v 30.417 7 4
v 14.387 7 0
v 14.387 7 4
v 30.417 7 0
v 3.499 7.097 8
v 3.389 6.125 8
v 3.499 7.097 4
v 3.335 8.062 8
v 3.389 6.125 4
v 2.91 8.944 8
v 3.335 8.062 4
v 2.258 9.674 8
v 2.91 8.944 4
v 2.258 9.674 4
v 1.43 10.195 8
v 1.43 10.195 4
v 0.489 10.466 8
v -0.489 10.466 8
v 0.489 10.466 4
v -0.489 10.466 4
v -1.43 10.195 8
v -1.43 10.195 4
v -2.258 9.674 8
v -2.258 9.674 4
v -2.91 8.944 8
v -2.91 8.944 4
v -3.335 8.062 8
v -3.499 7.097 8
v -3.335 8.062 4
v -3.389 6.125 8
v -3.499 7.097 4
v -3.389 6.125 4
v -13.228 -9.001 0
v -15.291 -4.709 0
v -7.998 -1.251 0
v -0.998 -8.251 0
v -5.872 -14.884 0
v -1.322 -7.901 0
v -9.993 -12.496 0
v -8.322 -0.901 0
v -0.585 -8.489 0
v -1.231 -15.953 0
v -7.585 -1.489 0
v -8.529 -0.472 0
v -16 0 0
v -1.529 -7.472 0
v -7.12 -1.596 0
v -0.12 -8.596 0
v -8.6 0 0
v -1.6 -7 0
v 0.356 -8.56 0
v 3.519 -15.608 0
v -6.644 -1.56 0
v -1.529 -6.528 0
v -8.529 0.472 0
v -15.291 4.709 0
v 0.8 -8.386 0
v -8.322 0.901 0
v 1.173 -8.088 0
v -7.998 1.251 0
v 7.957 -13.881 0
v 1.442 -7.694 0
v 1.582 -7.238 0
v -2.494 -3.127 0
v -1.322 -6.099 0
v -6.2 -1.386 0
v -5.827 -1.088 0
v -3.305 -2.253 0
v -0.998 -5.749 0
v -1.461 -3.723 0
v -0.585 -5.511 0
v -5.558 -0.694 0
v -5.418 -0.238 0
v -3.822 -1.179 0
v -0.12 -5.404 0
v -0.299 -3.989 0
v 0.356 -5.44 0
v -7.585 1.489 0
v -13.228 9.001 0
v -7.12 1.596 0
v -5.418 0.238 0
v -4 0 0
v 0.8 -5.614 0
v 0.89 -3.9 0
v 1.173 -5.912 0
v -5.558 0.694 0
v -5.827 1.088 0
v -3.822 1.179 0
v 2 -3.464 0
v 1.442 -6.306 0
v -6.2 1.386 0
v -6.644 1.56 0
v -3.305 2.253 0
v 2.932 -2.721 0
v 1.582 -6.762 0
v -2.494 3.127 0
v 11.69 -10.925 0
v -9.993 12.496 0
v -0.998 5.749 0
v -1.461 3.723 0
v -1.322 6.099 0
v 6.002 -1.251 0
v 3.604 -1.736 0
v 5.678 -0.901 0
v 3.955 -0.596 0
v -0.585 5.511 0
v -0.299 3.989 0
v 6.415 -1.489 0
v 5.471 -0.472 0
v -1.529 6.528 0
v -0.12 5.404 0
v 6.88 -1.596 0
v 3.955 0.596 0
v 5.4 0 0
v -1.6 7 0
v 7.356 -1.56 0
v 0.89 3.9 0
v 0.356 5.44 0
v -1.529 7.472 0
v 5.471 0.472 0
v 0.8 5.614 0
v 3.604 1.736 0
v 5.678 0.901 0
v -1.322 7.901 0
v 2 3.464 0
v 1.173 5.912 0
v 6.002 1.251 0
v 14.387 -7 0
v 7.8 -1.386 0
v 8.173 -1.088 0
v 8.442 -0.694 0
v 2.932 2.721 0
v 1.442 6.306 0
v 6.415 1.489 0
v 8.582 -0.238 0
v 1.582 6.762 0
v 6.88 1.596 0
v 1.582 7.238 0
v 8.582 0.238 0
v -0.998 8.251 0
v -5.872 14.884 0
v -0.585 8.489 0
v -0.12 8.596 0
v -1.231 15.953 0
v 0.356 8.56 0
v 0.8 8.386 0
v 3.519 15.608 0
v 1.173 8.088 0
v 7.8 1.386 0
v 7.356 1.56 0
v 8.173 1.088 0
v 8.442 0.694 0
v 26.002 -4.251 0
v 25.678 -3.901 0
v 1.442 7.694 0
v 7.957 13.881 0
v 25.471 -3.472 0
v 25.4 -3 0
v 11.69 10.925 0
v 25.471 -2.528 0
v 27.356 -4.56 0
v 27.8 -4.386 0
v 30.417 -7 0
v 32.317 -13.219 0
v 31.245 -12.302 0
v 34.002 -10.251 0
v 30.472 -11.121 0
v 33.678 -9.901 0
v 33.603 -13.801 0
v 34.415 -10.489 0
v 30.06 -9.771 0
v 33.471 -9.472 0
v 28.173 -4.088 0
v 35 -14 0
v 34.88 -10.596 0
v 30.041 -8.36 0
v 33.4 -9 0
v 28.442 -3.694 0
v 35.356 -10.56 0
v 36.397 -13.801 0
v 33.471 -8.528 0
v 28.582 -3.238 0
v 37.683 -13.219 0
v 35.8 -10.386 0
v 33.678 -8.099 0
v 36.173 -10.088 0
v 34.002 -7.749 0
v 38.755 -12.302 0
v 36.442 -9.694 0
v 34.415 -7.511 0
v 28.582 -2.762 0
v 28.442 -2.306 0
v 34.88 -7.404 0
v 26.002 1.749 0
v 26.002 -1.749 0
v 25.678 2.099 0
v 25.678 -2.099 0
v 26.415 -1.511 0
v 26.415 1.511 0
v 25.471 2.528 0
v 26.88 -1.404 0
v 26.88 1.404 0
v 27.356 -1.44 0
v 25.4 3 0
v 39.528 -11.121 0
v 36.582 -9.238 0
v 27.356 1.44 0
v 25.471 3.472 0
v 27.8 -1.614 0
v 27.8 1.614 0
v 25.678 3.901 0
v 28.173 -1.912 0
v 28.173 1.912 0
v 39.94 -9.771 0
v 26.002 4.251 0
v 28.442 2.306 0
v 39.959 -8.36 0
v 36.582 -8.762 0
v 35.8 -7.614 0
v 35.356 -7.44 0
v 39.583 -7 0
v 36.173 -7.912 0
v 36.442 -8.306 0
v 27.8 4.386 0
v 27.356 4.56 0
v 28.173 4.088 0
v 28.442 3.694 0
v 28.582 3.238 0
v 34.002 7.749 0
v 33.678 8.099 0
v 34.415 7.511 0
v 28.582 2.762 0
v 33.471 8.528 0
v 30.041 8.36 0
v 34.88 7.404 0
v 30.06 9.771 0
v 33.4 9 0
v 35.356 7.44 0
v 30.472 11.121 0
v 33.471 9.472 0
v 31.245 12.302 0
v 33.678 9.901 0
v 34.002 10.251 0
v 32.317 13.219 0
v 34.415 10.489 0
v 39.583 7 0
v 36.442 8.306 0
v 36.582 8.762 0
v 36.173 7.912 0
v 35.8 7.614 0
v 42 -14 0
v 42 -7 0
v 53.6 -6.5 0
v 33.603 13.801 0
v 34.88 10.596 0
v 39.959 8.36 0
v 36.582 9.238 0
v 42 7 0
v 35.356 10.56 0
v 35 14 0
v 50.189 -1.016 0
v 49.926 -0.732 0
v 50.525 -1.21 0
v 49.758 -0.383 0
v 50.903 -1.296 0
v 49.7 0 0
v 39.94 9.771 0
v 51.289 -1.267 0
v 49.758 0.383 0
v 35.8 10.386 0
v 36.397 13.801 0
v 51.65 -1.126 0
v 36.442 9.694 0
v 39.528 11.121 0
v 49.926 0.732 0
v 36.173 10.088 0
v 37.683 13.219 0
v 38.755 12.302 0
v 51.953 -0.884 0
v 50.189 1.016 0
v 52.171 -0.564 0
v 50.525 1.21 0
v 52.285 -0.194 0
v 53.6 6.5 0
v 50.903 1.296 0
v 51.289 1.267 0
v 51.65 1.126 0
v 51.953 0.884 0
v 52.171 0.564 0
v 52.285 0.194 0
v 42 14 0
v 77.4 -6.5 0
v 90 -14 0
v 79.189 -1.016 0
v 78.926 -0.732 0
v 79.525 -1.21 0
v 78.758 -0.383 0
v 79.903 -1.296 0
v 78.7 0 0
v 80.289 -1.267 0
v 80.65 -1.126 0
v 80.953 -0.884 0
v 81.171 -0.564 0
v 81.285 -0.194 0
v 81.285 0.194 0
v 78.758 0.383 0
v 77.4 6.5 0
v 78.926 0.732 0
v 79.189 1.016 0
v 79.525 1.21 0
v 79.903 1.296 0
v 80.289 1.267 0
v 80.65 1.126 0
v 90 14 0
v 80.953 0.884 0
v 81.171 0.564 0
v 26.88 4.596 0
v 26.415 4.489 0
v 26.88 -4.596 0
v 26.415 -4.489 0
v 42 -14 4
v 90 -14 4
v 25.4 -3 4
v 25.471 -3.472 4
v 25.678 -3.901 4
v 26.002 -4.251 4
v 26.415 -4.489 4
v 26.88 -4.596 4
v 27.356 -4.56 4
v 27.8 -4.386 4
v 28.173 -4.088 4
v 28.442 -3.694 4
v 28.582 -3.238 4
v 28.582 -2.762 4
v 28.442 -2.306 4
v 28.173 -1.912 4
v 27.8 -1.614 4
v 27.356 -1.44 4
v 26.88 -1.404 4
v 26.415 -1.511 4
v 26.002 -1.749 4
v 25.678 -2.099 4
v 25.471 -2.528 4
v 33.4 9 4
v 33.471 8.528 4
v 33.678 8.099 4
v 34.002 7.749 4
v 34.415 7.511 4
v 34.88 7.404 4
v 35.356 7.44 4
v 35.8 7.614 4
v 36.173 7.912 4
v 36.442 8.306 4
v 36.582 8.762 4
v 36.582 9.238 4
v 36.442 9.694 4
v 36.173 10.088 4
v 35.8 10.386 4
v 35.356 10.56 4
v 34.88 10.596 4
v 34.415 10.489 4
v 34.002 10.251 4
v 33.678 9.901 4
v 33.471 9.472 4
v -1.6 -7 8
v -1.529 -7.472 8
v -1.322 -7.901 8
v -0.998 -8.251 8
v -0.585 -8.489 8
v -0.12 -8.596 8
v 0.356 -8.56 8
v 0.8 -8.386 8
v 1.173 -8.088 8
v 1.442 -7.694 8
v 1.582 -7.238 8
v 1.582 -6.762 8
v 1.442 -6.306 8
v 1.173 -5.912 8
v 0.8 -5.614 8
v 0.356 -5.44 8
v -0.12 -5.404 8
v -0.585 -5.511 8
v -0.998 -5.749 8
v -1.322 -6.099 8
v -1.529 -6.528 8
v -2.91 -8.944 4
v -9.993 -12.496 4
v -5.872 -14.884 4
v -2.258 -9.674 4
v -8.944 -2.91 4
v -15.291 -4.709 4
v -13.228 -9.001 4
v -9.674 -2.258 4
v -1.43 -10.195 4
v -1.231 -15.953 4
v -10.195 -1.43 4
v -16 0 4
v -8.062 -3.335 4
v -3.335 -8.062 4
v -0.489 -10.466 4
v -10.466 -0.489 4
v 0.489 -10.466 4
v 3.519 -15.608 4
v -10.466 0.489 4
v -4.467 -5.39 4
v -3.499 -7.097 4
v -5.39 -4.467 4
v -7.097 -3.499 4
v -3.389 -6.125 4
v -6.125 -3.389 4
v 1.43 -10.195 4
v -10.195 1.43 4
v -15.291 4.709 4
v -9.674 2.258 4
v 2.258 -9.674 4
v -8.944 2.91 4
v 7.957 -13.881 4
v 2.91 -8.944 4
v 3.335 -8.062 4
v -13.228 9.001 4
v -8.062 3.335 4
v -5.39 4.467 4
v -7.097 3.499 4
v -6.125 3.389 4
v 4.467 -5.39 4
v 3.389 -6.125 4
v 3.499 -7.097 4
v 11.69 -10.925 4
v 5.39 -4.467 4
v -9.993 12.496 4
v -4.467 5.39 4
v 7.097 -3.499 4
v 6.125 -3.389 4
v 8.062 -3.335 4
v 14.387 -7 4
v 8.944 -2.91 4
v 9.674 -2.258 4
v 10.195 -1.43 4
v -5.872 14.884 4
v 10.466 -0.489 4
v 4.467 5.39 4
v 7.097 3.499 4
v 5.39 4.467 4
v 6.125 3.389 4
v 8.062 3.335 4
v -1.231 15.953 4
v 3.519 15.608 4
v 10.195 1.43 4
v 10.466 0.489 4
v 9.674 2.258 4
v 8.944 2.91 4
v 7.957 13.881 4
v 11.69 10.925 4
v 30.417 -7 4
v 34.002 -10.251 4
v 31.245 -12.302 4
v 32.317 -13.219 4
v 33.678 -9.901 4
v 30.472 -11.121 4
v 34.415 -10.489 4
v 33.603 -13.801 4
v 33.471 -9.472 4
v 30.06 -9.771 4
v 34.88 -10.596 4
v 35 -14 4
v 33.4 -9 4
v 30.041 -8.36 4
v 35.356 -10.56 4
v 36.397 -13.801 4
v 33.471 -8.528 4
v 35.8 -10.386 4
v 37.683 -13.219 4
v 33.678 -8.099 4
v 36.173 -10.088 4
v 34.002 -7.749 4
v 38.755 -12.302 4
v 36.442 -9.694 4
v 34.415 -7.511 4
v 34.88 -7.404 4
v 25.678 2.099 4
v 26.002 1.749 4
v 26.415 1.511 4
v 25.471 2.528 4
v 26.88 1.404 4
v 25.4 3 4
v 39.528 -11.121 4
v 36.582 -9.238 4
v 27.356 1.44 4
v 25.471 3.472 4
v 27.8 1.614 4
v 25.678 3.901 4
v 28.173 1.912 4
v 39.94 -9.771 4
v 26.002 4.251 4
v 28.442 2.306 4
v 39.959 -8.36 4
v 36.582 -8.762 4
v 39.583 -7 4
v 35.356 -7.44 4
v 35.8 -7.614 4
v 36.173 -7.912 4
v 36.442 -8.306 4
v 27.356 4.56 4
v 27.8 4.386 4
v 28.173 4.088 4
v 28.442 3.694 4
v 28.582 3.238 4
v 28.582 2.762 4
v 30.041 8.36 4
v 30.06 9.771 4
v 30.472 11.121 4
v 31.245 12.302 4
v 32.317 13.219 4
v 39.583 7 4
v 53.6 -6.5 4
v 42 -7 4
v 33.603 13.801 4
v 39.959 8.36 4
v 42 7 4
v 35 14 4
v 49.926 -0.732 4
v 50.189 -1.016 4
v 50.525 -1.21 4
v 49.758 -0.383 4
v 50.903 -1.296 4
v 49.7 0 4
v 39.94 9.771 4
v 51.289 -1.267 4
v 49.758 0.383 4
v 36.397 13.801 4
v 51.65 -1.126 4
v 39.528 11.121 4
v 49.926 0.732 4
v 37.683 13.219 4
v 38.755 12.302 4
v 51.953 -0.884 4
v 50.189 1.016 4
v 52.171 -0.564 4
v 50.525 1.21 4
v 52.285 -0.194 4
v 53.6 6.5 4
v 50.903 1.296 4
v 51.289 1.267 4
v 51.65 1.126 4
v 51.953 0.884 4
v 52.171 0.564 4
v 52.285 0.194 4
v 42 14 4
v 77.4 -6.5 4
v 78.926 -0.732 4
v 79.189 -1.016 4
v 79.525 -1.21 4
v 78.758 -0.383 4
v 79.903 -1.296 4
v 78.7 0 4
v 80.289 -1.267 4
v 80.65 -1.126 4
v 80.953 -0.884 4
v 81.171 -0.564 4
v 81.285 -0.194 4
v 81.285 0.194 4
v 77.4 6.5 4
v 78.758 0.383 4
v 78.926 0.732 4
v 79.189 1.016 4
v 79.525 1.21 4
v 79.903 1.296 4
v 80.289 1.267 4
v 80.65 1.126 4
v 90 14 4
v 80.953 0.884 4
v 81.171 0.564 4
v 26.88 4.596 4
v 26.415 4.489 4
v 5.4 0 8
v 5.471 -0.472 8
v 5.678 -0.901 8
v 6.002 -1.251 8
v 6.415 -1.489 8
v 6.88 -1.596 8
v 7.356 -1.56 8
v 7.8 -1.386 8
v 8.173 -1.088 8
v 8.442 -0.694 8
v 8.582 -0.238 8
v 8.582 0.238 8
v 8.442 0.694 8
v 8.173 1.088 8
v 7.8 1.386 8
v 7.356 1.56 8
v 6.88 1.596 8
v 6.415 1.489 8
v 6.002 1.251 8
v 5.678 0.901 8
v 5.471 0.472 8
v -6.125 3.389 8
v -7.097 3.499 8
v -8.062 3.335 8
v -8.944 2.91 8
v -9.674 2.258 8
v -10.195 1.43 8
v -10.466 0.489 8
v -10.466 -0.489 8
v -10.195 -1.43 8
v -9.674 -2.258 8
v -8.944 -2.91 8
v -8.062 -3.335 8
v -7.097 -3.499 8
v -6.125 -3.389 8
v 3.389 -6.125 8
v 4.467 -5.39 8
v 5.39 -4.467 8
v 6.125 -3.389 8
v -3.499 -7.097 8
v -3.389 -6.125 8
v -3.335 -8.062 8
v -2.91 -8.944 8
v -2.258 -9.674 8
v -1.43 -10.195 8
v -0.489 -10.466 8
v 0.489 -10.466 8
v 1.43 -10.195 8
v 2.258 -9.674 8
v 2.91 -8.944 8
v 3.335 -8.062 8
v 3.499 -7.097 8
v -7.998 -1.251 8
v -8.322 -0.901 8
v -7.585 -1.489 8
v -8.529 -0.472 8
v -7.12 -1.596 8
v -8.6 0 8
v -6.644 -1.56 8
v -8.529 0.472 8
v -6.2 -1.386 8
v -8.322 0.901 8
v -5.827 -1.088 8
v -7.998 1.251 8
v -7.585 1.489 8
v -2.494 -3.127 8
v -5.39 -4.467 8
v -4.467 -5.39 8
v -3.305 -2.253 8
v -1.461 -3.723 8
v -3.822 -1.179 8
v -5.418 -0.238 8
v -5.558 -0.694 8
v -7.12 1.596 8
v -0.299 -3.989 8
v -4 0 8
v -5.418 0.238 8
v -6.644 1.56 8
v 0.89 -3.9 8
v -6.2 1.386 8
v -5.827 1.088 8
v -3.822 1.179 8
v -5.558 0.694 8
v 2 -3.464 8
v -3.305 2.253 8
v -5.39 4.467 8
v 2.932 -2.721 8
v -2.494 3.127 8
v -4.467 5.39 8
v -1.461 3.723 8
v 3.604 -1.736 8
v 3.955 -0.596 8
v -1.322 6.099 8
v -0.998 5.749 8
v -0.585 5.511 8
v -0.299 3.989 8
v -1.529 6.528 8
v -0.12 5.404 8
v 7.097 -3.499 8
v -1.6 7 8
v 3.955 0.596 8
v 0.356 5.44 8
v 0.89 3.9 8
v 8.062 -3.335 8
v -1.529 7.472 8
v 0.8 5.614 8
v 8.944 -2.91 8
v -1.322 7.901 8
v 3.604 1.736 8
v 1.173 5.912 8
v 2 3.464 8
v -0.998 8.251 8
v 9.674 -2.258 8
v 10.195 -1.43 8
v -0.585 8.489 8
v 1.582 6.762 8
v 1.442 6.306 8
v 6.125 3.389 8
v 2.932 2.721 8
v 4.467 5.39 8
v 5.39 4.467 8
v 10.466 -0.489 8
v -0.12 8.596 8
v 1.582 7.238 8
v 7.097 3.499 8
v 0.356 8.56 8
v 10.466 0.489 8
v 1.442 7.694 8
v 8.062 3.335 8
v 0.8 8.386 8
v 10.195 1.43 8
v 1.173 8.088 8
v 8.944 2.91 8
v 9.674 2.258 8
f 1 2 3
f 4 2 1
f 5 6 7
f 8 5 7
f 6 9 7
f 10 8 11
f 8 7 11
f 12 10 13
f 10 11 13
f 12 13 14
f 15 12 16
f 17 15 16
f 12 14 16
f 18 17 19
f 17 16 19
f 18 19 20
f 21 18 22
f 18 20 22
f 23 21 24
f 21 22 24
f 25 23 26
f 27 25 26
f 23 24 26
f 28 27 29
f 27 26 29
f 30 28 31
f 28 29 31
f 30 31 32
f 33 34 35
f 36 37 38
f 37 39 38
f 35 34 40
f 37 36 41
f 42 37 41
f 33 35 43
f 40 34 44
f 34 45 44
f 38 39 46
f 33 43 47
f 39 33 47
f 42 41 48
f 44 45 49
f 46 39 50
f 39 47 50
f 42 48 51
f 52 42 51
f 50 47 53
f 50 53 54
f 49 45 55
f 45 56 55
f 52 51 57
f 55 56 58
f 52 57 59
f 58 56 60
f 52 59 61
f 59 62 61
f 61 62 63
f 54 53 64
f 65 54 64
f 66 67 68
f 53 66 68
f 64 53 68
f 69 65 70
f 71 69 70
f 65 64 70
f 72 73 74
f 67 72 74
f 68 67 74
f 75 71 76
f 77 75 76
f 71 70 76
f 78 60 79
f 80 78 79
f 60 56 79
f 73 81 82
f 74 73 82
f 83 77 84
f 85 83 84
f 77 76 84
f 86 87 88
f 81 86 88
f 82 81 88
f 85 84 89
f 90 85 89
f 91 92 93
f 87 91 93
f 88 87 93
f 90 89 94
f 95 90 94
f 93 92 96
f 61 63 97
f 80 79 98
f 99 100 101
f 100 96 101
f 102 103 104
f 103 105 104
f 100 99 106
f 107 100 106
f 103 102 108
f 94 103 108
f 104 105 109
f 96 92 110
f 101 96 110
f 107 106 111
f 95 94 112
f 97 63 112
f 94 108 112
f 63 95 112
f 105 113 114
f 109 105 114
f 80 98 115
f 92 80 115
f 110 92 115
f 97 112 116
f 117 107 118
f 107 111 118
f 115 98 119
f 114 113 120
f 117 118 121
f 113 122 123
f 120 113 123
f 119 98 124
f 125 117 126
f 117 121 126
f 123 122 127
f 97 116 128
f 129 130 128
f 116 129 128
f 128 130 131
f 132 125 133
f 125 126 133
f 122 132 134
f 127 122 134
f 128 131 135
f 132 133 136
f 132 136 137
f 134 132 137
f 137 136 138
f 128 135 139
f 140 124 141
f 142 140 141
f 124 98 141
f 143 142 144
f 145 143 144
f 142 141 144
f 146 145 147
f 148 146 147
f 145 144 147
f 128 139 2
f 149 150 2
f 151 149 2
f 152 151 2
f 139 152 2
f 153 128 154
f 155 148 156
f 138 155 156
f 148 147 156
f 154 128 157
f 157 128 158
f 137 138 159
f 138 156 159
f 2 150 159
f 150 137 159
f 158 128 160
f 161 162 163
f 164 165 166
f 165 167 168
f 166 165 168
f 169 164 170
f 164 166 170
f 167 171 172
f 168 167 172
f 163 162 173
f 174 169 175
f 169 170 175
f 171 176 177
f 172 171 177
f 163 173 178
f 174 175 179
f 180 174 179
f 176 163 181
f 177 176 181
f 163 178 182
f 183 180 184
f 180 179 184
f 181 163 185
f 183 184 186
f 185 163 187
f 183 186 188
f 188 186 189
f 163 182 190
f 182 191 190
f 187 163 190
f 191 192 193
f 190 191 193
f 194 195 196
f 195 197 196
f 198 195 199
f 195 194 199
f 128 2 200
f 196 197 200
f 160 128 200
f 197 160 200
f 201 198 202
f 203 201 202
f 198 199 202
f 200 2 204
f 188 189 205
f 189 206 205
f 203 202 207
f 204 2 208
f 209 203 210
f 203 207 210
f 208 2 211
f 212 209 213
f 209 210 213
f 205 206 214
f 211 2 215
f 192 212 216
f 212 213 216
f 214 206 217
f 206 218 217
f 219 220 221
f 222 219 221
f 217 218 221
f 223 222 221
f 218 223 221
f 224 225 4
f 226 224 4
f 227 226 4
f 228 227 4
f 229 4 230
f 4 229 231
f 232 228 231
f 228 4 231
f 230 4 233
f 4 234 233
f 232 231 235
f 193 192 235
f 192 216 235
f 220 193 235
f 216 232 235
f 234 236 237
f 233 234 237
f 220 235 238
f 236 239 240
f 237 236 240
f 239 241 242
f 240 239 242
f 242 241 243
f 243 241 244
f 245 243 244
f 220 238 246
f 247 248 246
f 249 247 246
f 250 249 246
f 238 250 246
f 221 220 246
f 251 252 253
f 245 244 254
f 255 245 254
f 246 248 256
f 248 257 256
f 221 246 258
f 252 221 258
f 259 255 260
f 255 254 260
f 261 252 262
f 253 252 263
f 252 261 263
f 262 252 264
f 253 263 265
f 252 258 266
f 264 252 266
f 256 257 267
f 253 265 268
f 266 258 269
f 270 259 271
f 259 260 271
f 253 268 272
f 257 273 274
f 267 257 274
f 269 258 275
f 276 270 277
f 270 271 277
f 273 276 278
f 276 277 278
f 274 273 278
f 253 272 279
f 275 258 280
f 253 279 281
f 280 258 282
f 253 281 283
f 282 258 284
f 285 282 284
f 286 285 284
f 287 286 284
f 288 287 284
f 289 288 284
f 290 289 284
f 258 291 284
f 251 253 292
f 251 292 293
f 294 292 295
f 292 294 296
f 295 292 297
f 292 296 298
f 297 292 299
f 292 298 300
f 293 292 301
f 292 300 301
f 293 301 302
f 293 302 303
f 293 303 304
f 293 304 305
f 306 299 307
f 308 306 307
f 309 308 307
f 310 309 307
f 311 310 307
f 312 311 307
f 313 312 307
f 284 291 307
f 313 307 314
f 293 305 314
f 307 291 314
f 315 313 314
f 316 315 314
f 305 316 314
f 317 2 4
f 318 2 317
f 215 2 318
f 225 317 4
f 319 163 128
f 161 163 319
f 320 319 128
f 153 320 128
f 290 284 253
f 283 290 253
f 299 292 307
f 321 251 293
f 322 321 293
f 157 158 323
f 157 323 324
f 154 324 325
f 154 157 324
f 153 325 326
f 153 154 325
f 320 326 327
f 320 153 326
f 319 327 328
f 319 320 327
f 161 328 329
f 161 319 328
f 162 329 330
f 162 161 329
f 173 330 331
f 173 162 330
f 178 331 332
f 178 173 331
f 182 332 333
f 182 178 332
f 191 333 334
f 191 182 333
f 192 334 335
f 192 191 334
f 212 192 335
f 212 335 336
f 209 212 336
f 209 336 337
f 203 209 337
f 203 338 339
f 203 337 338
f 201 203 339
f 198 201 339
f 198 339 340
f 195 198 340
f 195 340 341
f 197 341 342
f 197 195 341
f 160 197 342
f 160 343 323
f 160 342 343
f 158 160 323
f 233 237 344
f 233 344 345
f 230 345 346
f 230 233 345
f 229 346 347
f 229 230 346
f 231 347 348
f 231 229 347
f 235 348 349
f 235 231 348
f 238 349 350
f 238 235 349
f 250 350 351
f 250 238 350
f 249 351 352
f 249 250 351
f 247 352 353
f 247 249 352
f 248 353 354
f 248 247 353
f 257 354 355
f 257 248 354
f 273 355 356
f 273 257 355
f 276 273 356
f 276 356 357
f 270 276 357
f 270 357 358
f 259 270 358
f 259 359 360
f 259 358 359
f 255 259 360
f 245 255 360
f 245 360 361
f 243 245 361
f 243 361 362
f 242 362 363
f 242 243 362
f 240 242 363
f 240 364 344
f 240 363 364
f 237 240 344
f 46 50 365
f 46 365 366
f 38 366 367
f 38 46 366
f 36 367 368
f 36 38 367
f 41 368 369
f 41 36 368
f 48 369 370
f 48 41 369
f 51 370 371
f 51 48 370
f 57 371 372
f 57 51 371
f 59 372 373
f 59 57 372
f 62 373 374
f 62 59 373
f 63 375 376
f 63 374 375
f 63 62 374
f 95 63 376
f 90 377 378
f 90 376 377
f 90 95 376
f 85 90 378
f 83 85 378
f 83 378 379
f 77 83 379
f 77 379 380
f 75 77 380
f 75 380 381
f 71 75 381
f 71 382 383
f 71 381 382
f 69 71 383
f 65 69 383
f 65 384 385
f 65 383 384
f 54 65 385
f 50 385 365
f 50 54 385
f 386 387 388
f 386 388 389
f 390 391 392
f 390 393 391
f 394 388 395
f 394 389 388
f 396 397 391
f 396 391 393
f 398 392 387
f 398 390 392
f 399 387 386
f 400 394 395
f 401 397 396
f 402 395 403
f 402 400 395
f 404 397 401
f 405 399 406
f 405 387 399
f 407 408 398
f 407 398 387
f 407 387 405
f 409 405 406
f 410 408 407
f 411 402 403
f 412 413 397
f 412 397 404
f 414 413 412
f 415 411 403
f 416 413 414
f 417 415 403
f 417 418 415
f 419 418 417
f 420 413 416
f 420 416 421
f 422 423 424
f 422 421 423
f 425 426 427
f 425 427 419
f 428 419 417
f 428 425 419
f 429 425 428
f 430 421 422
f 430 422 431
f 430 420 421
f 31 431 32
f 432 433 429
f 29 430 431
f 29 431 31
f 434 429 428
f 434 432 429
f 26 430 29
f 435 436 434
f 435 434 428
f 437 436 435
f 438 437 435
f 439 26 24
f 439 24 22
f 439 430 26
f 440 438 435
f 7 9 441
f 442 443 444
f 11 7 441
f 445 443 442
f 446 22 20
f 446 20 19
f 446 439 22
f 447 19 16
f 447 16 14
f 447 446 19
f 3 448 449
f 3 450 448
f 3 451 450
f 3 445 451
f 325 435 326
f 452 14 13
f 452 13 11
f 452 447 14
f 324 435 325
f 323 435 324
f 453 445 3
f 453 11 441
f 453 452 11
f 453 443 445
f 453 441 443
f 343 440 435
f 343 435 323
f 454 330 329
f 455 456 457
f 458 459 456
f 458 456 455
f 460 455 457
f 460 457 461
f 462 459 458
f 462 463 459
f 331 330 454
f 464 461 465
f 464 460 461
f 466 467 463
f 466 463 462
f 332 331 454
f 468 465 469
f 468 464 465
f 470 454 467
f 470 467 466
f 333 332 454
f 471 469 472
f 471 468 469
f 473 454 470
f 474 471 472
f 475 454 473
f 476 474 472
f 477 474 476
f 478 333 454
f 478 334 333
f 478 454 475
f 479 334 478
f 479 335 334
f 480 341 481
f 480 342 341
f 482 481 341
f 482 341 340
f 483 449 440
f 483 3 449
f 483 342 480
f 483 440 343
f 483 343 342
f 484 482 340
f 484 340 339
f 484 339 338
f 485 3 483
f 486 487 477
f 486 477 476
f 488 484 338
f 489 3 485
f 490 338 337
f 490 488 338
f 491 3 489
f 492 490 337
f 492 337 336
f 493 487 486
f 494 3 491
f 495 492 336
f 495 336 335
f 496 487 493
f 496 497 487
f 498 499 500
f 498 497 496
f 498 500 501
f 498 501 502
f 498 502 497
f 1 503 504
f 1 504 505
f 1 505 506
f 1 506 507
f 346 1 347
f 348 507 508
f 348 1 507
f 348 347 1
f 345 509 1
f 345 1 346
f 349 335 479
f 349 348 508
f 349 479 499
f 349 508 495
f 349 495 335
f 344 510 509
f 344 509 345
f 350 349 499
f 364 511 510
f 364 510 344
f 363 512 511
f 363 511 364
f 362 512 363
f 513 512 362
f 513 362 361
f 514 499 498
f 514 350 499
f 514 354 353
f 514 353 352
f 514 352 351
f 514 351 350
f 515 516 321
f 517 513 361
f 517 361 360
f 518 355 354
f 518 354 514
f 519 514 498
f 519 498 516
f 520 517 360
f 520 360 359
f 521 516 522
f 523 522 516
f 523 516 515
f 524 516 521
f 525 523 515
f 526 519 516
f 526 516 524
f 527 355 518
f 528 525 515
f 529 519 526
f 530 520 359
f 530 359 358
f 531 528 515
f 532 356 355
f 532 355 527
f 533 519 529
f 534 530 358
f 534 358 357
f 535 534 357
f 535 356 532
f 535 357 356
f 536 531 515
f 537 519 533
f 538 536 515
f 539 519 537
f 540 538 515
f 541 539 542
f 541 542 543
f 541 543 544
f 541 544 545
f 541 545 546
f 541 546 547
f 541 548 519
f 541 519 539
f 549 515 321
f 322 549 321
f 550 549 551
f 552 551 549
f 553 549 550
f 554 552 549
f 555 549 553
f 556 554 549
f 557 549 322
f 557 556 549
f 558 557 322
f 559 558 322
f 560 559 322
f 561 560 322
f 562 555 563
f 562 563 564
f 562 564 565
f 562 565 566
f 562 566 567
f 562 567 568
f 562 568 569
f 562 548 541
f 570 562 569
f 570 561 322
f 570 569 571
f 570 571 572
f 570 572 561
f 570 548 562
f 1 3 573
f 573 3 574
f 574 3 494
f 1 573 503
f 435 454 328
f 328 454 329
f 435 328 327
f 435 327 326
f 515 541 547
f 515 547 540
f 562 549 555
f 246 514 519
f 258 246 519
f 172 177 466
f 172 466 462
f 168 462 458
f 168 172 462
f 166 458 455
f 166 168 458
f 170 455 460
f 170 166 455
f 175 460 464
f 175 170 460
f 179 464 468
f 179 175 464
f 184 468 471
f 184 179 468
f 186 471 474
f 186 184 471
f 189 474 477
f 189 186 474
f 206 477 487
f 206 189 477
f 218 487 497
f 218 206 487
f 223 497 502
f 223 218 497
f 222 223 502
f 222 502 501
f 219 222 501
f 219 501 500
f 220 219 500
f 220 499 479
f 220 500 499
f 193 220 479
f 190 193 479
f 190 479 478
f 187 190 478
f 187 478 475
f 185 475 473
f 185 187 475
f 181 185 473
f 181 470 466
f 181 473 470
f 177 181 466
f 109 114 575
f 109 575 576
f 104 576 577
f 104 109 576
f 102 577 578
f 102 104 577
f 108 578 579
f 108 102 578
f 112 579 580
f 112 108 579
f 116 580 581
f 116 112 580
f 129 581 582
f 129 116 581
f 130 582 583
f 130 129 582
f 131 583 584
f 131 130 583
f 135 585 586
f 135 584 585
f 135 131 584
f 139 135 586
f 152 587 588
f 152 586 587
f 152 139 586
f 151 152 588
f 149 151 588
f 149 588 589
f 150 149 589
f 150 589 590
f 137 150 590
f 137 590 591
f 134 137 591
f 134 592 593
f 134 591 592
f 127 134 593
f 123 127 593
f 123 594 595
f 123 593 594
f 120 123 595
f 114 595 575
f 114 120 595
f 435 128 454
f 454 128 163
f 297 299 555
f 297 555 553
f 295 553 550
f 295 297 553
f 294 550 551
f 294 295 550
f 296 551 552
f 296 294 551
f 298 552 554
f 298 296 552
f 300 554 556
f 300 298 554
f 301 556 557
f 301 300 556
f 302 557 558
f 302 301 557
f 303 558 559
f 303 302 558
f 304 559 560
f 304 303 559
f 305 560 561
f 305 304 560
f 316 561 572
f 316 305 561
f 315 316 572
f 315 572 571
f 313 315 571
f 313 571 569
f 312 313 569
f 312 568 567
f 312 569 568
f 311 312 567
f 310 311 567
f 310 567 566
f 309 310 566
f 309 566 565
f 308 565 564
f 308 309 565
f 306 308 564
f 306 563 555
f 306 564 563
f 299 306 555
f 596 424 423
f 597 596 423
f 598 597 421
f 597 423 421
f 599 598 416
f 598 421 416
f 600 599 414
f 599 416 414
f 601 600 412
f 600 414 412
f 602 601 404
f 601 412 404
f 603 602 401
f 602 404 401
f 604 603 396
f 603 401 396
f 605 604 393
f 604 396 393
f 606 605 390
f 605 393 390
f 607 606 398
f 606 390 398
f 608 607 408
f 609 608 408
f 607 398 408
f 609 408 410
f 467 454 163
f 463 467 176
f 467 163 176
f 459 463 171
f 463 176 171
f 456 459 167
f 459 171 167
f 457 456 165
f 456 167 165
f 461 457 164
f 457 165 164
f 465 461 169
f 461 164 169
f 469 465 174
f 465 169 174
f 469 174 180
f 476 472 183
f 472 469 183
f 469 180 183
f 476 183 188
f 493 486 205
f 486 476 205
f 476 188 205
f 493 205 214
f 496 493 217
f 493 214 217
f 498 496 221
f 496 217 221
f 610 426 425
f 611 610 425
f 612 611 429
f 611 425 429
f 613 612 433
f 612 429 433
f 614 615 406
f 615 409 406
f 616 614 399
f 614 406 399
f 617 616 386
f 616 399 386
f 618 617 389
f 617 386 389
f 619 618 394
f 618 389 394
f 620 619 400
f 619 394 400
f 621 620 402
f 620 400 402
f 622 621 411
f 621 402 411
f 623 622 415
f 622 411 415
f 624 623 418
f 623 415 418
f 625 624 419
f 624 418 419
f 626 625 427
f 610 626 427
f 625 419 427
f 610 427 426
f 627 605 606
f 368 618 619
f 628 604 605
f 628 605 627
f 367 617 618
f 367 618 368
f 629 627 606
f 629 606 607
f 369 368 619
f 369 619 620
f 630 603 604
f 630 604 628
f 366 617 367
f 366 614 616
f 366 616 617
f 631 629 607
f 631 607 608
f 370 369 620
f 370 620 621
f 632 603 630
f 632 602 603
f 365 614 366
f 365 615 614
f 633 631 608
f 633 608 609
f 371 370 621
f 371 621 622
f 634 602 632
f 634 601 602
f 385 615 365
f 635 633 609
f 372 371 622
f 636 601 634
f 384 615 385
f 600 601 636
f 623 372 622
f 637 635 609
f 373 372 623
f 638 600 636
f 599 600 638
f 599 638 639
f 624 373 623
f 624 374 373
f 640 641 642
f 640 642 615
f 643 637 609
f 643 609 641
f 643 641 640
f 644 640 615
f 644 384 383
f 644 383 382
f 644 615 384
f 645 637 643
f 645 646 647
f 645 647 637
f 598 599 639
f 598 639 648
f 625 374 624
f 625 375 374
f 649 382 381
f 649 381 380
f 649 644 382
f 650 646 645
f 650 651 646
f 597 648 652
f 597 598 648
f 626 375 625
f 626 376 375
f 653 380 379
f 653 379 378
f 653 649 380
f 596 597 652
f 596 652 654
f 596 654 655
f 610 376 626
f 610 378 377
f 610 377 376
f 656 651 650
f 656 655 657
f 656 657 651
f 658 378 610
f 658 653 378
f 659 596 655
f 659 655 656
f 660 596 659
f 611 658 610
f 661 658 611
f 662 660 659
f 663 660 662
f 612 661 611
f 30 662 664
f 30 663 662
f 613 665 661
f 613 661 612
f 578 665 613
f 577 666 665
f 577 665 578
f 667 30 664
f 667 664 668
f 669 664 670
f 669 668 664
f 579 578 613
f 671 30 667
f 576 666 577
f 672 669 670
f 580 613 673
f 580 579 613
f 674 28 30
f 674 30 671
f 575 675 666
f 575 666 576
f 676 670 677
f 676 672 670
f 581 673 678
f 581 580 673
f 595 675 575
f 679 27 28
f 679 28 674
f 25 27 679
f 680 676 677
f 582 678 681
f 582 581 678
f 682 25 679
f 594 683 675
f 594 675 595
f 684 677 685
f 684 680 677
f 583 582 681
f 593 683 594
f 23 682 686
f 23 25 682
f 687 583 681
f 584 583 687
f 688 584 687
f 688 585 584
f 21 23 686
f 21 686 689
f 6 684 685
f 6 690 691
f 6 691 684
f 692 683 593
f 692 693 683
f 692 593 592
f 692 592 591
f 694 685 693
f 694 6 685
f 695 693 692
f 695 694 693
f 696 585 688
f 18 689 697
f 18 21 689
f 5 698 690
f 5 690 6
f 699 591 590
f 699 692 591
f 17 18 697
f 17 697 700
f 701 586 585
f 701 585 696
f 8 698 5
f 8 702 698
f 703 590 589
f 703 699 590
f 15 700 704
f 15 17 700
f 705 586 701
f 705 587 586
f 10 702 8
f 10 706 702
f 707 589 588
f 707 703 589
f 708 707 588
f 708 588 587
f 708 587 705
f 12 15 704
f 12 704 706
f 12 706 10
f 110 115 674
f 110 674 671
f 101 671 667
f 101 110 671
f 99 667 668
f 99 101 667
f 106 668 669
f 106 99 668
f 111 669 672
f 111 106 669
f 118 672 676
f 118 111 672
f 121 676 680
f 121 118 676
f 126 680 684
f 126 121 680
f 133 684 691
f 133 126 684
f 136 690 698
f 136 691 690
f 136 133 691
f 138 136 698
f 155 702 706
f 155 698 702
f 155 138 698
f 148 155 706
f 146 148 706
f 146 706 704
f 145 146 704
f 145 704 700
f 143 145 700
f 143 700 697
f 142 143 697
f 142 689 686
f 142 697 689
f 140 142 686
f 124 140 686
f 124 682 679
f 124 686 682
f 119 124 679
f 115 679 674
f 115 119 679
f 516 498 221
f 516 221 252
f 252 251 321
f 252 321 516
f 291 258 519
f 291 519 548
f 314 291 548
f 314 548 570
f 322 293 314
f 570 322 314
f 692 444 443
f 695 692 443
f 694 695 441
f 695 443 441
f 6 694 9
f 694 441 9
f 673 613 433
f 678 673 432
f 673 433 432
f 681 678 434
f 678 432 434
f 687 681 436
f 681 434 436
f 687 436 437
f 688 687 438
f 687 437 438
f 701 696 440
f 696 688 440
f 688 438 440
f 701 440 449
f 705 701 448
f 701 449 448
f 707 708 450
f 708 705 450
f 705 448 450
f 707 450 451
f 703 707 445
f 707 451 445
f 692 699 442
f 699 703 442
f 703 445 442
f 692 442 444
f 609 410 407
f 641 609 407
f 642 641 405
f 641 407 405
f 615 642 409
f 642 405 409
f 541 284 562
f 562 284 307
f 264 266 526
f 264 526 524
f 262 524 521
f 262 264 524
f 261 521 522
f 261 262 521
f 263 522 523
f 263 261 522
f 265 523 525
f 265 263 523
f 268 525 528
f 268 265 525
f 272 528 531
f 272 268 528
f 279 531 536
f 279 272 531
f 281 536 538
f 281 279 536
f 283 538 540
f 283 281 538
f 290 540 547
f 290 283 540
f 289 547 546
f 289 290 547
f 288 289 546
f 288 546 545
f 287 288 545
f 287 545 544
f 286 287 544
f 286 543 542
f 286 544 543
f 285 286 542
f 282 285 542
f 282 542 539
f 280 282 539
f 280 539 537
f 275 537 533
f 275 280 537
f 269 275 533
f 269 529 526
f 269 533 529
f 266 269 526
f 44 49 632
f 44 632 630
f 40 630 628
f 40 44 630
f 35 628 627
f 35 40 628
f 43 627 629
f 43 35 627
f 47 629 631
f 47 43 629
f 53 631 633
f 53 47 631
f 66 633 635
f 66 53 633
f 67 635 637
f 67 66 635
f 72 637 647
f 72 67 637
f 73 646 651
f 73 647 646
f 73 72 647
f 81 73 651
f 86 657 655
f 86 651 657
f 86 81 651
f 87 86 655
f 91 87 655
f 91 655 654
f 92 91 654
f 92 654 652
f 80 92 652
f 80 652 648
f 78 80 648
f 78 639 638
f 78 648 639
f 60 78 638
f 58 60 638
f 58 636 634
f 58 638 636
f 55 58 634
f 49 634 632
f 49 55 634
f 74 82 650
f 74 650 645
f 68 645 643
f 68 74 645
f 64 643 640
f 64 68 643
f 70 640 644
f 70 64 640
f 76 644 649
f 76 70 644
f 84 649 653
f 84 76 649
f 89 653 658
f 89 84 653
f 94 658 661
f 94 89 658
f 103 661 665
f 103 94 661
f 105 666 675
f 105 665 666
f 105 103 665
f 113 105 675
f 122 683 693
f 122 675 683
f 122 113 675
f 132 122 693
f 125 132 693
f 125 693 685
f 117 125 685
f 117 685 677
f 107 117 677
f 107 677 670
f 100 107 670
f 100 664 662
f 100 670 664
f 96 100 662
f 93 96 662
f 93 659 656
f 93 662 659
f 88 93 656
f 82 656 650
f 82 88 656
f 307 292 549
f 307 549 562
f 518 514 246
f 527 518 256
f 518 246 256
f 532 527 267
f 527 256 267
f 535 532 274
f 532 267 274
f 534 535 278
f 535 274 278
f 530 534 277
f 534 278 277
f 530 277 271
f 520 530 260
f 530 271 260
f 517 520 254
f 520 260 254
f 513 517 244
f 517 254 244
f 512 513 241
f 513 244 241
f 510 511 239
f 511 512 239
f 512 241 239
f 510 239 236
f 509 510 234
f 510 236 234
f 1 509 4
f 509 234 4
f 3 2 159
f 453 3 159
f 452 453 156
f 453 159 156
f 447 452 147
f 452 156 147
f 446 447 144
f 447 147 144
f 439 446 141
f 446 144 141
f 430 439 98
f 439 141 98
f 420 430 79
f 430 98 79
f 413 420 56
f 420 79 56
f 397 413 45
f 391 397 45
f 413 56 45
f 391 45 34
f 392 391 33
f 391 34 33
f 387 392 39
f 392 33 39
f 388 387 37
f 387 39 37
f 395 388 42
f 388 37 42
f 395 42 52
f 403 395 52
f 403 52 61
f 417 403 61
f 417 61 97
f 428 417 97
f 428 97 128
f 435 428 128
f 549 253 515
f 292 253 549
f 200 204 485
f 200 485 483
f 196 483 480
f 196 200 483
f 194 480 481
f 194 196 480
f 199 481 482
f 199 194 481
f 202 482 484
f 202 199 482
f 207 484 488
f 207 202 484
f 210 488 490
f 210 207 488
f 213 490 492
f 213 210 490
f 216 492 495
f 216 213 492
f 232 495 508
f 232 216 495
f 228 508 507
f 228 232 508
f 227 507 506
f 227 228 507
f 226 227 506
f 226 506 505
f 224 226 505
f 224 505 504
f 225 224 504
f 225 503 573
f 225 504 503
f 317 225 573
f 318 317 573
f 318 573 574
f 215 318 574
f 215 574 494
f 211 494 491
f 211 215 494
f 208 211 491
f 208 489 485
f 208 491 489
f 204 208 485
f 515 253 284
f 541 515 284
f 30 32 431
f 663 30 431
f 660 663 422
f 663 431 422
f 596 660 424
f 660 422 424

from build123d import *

# Parameters (mm, degrees)
MAIN_WEB_PROFILE_W                      = 60
MAIN_WEB_PROFILE_H                      = 14
MAIN_WEB_DEPTH                          = 4
SHOULDER_HORN_FLANGE_PROFILE_R          = 16
SHOULDER_HORN_FLANGE_DEPTH              = 4
ELBOW_SERVO_MOUNT_PROFILE_W             = 48
ELBOW_SERVO_MOUNT_PROFILE_H             = 28
ELBOW_SERVO_MOUNT_DEPTH                 = 4
SG90_BODY_CLEARANCE_START               = -5
SG90_BODY_CLEARANCE_PROFILE_W           = 23.8
SG90_BODY_CLEARANCE_PROFILE_H           = 13
SG90_BODY_CLEARANCE_DEPTH               = 97.49863387
ELBOW_TAB_FASTENERS_START               = -50
ELBOW_TAB_FASTENERS_PROFILE_R           = 1.3
ELBOW_TAB_FASTENERS_DEPTH               = 142.49863387
SHOULDER_CENTER_SCREW_ACCESS_START      = -50
SHOULDER_CENTER_SCREW_ACCESS_PROFILE_R  = 4
SHOULDER_CENTER_SCREW_ACCESS_DEPTH      = 142.49863387
CABLE_TIE_HOLES_START                   = -50
CABLE_TIE_HOLES_PROFILE_R               = 1.6
CABLE_TIE_HOLES_DEPTH                   = 142.49863387
PASSIVE_LOWER_MOUNT_BOSS_PROFILE_R      = 5
PASSIVE_LOWER_MOUNT_BOSS_DEPTH          = 4
PASSIVE_UPPER_MOUNT_BOSS_PROFILE_R      = 5
PASSIVE_UPPER_MOUNT_BOSS_DEPTH          = 4
PASSIVE_CHEEK_STANDOFFS_START           = -50
PASSIVE_CHEEK_STANDOFFS_PROFILE_R       = 1.6
PASSIVE_CHEEK_STANDOFFS_DEPTH           = 142.49863387
SHOULDER_DOWEL_SUPPORT_HUB_START        = 4
SHOULDER_DOWEL_SUPPORT_HUB_PROFILE_R    = 7
SHOULDER_DOWEL_SUPPORT_HUB_PROFILE_R_2  = 4
SHOULDER_DOWEL_SUPPORT_HUB_DEPTH        = 4
RAISED_M3_WASHER_SEATS_HEIGHT8_START    = 4
RAISED_M3_WASHER_SEATS_PCD14_PROFILE_R  = 3.5
RAISED_M3_WASHER_SEATS_HEIGHT8_DEPTH    = 4
METAL_HORN_M3_CLEARANCE_PCD14_START     = -50
METAL_HORN_M3_CLEARANCE_PCD14_PROFILE_R = 1.6
METAL_HORN_M3_CLEARANCE_PCD14_DEPTH     = 142.760557976
RESTORE_SHOULDER_SLEEVE_BORE_START      = -50
RESTORE_SHOULDER_SLEEVE_BORE_PROFILE_R  = 4
RESTORE_SHOULDER_SLEEVE_BORE_DEPTH      = 142.760557976


with BuildPart() as part:
    # Main_web_profile → Main_web (new body)
    with BuildSketch(Plane.XY):
        with Locations((30, 0)):
            Rectangle(MAIN_WEB_PROFILE_W, MAIN_WEB_PROFILE_H)
    extrude(amount=MAIN_WEB_DEPTH)

    # Shoulder_horn_flange_profile → Shoulder_horn_flange (add)
    with BuildSketch(Plane.XY):
        Circle(SHOULDER_HORN_FLANGE_PROFILE_R)
    extrude(amount=SHOULDER_HORN_FLANGE_DEPTH)

    # Elbow_servo_mount_profile → Elbow_servo_mount (add)
    with BuildSketch(Plane.XY):
        with Locations((66, 0)):
            Rectangle(ELBOW_SERVO_MOUNT_PROFILE_W, ELBOW_SERVO_MOUNT_PROFILE_H)
    extrude(amount=ELBOW_SERVO_MOUNT_DEPTH)

    # SG90_body_clearance_profile → SG90_body_clearance (cut, through all)
    with BuildSketch(Plane.XY.offset(SG90_BODY_CLEARANCE_START)):
        with Locations((65.5, 0)):
            Rectangle(SG90_BODY_CLEARANCE_PROFILE_W, SG90_BODY_CLEARANCE_PROFILE_H)
    extrude(amount=SG90_BODY_CLEARANCE_DEPTH, mode=Mode.SUBTRACT)

    # Elbow_tab_fasteners_profile → Elbow_tab_fasteners (cut, through all)
    with BuildSketch(Plane.XY.offset(ELBOW_TAB_FASTENERS_START)):
        with Locations(Location((51, 0, 0), (0, 0, 180))):
            Circle(ELBOW_TAB_FASTENERS_PROFILE_R)
        with Locations(Location((80, 0, 0), (0, 0, 180))):
            Circle(ELBOW_TAB_FASTENERS_PROFILE_R)
    extrude(amount=ELBOW_TAB_FASTENERS_DEPTH, mode=Mode.SUBTRACT)

    # Shoulder_center_screw_access_profile → Shoulder_center_screw_access (cut, through all)
    with BuildSketch(Plane.XY.offset(SHOULDER_CENTER_SCREW_ACCESS_START)):
        with Locations(Location((0, 0, 0), (0, 0, 180))):
            Circle(SHOULDER_CENTER_SCREW_ACCESS_PROFILE_R)
    extrude(amount=SHOULDER_CENTER_SCREW_ACCESS_DEPTH, mode=Mode.SUBTRACT)

    # Cable_tie_holes_profile → Cable_tie_holes (cut, through all)
    with BuildSketch(Plane.XY.offset(CABLE_TIE_HOLES_START)):
        with Locations(Location((27, -3, 0), (0, 0, 180))):
            Circle(CABLE_TIE_HOLES_PROFILE_R)
        with Locations(Location((27, 3, 0), (0, 0, 180))):
            Circle(CABLE_TIE_HOLES_PROFILE_R)
    extrude(amount=CABLE_TIE_HOLES_DEPTH, mode=Mode.SUBTRACT)

    # Passive_lower_mount_boss_profile → Passive_lower_mount_boss (add)
    with BuildSketch(Plane.XY):
        with Locations((35, -9)):
            Circle(PASSIVE_LOWER_MOUNT_BOSS_PROFILE_R)
    extrude(amount=PASSIVE_LOWER_MOUNT_BOSS_DEPTH)

    # Passive_upper_mount_boss_profile → Passive_upper_mount_boss (add)
    with BuildSketch(Plane.XY):
        with Locations((35, 9)):
            Circle(PASSIVE_UPPER_MOUNT_BOSS_PROFILE_R)
    extrude(amount=PASSIVE_UPPER_MOUNT_BOSS_DEPTH)

    # Passive_cheek_standoffs_profile → Passive_cheek_standoffs (cut, through all)
    with BuildSketch(Plane.XY.offset(PASSIVE_CHEEK_STANDOFFS_START)):
        with Locations(Location((35, -9, 0), (0, 0, 180))):
            Circle(PASSIVE_CHEEK_STANDOFFS_PROFILE_R)
        with Locations(Location((35, 9, 0), (0, 0, 180))):
            Circle(PASSIVE_CHEEK_STANDOFFS_PROFILE_R)
    extrude(amount=PASSIVE_CHEEK_STANDOFFS_DEPTH, mode=Mode.SUBTRACT)

    # Shoulder_dowel_support_hub_profile → Shoulder_dowel_support_hub (add)
    with BuildSketch(Plane.XY.offset(SHOULDER_DOWEL_SUPPORT_HUB_START)):
        Circle(SHOULDER_DOWEL_SUPPORT_HUB_PROFILE_R)
        with Locations(Location((0, 0, 0), (0, 0, 180))):
            Circle(SHOULDER_DOWEL_SUPPORT_HUB_PROFILE_R_2, mode=Mode.SUBTRACT)
    extrude(amount=SHOULDER_DOWEL_SUPPORT_HUB_DEPTH)

    # Raised_M3_washer_seats_PCD14_profile → Raised_M3_washer_seats_height8 (add)
    with BuildSketch(Plane.XY.offset(RAISED_M3_WASHER_SEATS_HEIGHT8_START)):
        with Locations((7, 0)):
            Circle(RAISED_M3_WASHER_SEATS_PCD14_PROFILE_R)
        with Locations((-7, 0)):
            Circle(RAISED_M3_WASHER_SEATS_PCD14_PROFILE_R)
        with Locations((0, 7)):
            Circle(RAISED_M3_WASHER_SEATS_PCD14_PROFILE_R)
        with Locations((0, -7)):
            Circle(RAISED_M3_WASHER_SEATS_PCD14_PROFILE_R)
    extrude(amount=RAISED_M3_WASHER_SEATS_HEIGHT8_DEPTH)

    # Metal_horn_M3_clearance_PCD14_profile → Metal_horn_M3_clearance_PCD14 (cut, through all)
    with BuildSketch(Plane.XY.offset(METAL_HORN_M3_CLEARANCE_PCD14_START)):
        with Locations(Location((7, 0, 0), (0, 0, 180))):
            Circle(METAL_HORN_M3_CLEARANCE_PCD14_PROFILE_R)
        with Locations(Location((-7, 0, 0), (0, 0, 180))):
            Circle(METAL_HORN_M3_CLEARANCE_PCD14_PROFILE_R)
        with Locations(Location((0, 7, 0), (0, 0, 180))):
            Circle(METAL_HORN_M3_CLEARANCE_PCD14_PROFILE_R)
        with Locations(Location((0, -7, 0), (0, 0, 180))):
            Circle(METAL_HORN_M3_CLEARANCE_PCD14_PROFILE_R)
    extrude(amount=METAL_HORN_M3_CLEARANCE_PCD14_DEPTH, mode=Mode.SUBTRACT)

    # Restore_shoulder_sleeve_bore_profile → Restore_shoulder_sleeve_bore (cut, through all)
    with BuildSketch(Plane.XY.offset(RESTORE_SHOULDER_SLEEVE_BORE_START)):
        with Locations(Location((0, 0, 0), (0, 0, 180))):
            Circle(RESTORE_SHOULDER_SLEEVE_BORE_PROFILE_R)
    extrude(amount=RESTORE_SHOULDER_SLEEVE_BORE_DEPTH, mode=Mode.SUBTRACT)


solid = part.part
